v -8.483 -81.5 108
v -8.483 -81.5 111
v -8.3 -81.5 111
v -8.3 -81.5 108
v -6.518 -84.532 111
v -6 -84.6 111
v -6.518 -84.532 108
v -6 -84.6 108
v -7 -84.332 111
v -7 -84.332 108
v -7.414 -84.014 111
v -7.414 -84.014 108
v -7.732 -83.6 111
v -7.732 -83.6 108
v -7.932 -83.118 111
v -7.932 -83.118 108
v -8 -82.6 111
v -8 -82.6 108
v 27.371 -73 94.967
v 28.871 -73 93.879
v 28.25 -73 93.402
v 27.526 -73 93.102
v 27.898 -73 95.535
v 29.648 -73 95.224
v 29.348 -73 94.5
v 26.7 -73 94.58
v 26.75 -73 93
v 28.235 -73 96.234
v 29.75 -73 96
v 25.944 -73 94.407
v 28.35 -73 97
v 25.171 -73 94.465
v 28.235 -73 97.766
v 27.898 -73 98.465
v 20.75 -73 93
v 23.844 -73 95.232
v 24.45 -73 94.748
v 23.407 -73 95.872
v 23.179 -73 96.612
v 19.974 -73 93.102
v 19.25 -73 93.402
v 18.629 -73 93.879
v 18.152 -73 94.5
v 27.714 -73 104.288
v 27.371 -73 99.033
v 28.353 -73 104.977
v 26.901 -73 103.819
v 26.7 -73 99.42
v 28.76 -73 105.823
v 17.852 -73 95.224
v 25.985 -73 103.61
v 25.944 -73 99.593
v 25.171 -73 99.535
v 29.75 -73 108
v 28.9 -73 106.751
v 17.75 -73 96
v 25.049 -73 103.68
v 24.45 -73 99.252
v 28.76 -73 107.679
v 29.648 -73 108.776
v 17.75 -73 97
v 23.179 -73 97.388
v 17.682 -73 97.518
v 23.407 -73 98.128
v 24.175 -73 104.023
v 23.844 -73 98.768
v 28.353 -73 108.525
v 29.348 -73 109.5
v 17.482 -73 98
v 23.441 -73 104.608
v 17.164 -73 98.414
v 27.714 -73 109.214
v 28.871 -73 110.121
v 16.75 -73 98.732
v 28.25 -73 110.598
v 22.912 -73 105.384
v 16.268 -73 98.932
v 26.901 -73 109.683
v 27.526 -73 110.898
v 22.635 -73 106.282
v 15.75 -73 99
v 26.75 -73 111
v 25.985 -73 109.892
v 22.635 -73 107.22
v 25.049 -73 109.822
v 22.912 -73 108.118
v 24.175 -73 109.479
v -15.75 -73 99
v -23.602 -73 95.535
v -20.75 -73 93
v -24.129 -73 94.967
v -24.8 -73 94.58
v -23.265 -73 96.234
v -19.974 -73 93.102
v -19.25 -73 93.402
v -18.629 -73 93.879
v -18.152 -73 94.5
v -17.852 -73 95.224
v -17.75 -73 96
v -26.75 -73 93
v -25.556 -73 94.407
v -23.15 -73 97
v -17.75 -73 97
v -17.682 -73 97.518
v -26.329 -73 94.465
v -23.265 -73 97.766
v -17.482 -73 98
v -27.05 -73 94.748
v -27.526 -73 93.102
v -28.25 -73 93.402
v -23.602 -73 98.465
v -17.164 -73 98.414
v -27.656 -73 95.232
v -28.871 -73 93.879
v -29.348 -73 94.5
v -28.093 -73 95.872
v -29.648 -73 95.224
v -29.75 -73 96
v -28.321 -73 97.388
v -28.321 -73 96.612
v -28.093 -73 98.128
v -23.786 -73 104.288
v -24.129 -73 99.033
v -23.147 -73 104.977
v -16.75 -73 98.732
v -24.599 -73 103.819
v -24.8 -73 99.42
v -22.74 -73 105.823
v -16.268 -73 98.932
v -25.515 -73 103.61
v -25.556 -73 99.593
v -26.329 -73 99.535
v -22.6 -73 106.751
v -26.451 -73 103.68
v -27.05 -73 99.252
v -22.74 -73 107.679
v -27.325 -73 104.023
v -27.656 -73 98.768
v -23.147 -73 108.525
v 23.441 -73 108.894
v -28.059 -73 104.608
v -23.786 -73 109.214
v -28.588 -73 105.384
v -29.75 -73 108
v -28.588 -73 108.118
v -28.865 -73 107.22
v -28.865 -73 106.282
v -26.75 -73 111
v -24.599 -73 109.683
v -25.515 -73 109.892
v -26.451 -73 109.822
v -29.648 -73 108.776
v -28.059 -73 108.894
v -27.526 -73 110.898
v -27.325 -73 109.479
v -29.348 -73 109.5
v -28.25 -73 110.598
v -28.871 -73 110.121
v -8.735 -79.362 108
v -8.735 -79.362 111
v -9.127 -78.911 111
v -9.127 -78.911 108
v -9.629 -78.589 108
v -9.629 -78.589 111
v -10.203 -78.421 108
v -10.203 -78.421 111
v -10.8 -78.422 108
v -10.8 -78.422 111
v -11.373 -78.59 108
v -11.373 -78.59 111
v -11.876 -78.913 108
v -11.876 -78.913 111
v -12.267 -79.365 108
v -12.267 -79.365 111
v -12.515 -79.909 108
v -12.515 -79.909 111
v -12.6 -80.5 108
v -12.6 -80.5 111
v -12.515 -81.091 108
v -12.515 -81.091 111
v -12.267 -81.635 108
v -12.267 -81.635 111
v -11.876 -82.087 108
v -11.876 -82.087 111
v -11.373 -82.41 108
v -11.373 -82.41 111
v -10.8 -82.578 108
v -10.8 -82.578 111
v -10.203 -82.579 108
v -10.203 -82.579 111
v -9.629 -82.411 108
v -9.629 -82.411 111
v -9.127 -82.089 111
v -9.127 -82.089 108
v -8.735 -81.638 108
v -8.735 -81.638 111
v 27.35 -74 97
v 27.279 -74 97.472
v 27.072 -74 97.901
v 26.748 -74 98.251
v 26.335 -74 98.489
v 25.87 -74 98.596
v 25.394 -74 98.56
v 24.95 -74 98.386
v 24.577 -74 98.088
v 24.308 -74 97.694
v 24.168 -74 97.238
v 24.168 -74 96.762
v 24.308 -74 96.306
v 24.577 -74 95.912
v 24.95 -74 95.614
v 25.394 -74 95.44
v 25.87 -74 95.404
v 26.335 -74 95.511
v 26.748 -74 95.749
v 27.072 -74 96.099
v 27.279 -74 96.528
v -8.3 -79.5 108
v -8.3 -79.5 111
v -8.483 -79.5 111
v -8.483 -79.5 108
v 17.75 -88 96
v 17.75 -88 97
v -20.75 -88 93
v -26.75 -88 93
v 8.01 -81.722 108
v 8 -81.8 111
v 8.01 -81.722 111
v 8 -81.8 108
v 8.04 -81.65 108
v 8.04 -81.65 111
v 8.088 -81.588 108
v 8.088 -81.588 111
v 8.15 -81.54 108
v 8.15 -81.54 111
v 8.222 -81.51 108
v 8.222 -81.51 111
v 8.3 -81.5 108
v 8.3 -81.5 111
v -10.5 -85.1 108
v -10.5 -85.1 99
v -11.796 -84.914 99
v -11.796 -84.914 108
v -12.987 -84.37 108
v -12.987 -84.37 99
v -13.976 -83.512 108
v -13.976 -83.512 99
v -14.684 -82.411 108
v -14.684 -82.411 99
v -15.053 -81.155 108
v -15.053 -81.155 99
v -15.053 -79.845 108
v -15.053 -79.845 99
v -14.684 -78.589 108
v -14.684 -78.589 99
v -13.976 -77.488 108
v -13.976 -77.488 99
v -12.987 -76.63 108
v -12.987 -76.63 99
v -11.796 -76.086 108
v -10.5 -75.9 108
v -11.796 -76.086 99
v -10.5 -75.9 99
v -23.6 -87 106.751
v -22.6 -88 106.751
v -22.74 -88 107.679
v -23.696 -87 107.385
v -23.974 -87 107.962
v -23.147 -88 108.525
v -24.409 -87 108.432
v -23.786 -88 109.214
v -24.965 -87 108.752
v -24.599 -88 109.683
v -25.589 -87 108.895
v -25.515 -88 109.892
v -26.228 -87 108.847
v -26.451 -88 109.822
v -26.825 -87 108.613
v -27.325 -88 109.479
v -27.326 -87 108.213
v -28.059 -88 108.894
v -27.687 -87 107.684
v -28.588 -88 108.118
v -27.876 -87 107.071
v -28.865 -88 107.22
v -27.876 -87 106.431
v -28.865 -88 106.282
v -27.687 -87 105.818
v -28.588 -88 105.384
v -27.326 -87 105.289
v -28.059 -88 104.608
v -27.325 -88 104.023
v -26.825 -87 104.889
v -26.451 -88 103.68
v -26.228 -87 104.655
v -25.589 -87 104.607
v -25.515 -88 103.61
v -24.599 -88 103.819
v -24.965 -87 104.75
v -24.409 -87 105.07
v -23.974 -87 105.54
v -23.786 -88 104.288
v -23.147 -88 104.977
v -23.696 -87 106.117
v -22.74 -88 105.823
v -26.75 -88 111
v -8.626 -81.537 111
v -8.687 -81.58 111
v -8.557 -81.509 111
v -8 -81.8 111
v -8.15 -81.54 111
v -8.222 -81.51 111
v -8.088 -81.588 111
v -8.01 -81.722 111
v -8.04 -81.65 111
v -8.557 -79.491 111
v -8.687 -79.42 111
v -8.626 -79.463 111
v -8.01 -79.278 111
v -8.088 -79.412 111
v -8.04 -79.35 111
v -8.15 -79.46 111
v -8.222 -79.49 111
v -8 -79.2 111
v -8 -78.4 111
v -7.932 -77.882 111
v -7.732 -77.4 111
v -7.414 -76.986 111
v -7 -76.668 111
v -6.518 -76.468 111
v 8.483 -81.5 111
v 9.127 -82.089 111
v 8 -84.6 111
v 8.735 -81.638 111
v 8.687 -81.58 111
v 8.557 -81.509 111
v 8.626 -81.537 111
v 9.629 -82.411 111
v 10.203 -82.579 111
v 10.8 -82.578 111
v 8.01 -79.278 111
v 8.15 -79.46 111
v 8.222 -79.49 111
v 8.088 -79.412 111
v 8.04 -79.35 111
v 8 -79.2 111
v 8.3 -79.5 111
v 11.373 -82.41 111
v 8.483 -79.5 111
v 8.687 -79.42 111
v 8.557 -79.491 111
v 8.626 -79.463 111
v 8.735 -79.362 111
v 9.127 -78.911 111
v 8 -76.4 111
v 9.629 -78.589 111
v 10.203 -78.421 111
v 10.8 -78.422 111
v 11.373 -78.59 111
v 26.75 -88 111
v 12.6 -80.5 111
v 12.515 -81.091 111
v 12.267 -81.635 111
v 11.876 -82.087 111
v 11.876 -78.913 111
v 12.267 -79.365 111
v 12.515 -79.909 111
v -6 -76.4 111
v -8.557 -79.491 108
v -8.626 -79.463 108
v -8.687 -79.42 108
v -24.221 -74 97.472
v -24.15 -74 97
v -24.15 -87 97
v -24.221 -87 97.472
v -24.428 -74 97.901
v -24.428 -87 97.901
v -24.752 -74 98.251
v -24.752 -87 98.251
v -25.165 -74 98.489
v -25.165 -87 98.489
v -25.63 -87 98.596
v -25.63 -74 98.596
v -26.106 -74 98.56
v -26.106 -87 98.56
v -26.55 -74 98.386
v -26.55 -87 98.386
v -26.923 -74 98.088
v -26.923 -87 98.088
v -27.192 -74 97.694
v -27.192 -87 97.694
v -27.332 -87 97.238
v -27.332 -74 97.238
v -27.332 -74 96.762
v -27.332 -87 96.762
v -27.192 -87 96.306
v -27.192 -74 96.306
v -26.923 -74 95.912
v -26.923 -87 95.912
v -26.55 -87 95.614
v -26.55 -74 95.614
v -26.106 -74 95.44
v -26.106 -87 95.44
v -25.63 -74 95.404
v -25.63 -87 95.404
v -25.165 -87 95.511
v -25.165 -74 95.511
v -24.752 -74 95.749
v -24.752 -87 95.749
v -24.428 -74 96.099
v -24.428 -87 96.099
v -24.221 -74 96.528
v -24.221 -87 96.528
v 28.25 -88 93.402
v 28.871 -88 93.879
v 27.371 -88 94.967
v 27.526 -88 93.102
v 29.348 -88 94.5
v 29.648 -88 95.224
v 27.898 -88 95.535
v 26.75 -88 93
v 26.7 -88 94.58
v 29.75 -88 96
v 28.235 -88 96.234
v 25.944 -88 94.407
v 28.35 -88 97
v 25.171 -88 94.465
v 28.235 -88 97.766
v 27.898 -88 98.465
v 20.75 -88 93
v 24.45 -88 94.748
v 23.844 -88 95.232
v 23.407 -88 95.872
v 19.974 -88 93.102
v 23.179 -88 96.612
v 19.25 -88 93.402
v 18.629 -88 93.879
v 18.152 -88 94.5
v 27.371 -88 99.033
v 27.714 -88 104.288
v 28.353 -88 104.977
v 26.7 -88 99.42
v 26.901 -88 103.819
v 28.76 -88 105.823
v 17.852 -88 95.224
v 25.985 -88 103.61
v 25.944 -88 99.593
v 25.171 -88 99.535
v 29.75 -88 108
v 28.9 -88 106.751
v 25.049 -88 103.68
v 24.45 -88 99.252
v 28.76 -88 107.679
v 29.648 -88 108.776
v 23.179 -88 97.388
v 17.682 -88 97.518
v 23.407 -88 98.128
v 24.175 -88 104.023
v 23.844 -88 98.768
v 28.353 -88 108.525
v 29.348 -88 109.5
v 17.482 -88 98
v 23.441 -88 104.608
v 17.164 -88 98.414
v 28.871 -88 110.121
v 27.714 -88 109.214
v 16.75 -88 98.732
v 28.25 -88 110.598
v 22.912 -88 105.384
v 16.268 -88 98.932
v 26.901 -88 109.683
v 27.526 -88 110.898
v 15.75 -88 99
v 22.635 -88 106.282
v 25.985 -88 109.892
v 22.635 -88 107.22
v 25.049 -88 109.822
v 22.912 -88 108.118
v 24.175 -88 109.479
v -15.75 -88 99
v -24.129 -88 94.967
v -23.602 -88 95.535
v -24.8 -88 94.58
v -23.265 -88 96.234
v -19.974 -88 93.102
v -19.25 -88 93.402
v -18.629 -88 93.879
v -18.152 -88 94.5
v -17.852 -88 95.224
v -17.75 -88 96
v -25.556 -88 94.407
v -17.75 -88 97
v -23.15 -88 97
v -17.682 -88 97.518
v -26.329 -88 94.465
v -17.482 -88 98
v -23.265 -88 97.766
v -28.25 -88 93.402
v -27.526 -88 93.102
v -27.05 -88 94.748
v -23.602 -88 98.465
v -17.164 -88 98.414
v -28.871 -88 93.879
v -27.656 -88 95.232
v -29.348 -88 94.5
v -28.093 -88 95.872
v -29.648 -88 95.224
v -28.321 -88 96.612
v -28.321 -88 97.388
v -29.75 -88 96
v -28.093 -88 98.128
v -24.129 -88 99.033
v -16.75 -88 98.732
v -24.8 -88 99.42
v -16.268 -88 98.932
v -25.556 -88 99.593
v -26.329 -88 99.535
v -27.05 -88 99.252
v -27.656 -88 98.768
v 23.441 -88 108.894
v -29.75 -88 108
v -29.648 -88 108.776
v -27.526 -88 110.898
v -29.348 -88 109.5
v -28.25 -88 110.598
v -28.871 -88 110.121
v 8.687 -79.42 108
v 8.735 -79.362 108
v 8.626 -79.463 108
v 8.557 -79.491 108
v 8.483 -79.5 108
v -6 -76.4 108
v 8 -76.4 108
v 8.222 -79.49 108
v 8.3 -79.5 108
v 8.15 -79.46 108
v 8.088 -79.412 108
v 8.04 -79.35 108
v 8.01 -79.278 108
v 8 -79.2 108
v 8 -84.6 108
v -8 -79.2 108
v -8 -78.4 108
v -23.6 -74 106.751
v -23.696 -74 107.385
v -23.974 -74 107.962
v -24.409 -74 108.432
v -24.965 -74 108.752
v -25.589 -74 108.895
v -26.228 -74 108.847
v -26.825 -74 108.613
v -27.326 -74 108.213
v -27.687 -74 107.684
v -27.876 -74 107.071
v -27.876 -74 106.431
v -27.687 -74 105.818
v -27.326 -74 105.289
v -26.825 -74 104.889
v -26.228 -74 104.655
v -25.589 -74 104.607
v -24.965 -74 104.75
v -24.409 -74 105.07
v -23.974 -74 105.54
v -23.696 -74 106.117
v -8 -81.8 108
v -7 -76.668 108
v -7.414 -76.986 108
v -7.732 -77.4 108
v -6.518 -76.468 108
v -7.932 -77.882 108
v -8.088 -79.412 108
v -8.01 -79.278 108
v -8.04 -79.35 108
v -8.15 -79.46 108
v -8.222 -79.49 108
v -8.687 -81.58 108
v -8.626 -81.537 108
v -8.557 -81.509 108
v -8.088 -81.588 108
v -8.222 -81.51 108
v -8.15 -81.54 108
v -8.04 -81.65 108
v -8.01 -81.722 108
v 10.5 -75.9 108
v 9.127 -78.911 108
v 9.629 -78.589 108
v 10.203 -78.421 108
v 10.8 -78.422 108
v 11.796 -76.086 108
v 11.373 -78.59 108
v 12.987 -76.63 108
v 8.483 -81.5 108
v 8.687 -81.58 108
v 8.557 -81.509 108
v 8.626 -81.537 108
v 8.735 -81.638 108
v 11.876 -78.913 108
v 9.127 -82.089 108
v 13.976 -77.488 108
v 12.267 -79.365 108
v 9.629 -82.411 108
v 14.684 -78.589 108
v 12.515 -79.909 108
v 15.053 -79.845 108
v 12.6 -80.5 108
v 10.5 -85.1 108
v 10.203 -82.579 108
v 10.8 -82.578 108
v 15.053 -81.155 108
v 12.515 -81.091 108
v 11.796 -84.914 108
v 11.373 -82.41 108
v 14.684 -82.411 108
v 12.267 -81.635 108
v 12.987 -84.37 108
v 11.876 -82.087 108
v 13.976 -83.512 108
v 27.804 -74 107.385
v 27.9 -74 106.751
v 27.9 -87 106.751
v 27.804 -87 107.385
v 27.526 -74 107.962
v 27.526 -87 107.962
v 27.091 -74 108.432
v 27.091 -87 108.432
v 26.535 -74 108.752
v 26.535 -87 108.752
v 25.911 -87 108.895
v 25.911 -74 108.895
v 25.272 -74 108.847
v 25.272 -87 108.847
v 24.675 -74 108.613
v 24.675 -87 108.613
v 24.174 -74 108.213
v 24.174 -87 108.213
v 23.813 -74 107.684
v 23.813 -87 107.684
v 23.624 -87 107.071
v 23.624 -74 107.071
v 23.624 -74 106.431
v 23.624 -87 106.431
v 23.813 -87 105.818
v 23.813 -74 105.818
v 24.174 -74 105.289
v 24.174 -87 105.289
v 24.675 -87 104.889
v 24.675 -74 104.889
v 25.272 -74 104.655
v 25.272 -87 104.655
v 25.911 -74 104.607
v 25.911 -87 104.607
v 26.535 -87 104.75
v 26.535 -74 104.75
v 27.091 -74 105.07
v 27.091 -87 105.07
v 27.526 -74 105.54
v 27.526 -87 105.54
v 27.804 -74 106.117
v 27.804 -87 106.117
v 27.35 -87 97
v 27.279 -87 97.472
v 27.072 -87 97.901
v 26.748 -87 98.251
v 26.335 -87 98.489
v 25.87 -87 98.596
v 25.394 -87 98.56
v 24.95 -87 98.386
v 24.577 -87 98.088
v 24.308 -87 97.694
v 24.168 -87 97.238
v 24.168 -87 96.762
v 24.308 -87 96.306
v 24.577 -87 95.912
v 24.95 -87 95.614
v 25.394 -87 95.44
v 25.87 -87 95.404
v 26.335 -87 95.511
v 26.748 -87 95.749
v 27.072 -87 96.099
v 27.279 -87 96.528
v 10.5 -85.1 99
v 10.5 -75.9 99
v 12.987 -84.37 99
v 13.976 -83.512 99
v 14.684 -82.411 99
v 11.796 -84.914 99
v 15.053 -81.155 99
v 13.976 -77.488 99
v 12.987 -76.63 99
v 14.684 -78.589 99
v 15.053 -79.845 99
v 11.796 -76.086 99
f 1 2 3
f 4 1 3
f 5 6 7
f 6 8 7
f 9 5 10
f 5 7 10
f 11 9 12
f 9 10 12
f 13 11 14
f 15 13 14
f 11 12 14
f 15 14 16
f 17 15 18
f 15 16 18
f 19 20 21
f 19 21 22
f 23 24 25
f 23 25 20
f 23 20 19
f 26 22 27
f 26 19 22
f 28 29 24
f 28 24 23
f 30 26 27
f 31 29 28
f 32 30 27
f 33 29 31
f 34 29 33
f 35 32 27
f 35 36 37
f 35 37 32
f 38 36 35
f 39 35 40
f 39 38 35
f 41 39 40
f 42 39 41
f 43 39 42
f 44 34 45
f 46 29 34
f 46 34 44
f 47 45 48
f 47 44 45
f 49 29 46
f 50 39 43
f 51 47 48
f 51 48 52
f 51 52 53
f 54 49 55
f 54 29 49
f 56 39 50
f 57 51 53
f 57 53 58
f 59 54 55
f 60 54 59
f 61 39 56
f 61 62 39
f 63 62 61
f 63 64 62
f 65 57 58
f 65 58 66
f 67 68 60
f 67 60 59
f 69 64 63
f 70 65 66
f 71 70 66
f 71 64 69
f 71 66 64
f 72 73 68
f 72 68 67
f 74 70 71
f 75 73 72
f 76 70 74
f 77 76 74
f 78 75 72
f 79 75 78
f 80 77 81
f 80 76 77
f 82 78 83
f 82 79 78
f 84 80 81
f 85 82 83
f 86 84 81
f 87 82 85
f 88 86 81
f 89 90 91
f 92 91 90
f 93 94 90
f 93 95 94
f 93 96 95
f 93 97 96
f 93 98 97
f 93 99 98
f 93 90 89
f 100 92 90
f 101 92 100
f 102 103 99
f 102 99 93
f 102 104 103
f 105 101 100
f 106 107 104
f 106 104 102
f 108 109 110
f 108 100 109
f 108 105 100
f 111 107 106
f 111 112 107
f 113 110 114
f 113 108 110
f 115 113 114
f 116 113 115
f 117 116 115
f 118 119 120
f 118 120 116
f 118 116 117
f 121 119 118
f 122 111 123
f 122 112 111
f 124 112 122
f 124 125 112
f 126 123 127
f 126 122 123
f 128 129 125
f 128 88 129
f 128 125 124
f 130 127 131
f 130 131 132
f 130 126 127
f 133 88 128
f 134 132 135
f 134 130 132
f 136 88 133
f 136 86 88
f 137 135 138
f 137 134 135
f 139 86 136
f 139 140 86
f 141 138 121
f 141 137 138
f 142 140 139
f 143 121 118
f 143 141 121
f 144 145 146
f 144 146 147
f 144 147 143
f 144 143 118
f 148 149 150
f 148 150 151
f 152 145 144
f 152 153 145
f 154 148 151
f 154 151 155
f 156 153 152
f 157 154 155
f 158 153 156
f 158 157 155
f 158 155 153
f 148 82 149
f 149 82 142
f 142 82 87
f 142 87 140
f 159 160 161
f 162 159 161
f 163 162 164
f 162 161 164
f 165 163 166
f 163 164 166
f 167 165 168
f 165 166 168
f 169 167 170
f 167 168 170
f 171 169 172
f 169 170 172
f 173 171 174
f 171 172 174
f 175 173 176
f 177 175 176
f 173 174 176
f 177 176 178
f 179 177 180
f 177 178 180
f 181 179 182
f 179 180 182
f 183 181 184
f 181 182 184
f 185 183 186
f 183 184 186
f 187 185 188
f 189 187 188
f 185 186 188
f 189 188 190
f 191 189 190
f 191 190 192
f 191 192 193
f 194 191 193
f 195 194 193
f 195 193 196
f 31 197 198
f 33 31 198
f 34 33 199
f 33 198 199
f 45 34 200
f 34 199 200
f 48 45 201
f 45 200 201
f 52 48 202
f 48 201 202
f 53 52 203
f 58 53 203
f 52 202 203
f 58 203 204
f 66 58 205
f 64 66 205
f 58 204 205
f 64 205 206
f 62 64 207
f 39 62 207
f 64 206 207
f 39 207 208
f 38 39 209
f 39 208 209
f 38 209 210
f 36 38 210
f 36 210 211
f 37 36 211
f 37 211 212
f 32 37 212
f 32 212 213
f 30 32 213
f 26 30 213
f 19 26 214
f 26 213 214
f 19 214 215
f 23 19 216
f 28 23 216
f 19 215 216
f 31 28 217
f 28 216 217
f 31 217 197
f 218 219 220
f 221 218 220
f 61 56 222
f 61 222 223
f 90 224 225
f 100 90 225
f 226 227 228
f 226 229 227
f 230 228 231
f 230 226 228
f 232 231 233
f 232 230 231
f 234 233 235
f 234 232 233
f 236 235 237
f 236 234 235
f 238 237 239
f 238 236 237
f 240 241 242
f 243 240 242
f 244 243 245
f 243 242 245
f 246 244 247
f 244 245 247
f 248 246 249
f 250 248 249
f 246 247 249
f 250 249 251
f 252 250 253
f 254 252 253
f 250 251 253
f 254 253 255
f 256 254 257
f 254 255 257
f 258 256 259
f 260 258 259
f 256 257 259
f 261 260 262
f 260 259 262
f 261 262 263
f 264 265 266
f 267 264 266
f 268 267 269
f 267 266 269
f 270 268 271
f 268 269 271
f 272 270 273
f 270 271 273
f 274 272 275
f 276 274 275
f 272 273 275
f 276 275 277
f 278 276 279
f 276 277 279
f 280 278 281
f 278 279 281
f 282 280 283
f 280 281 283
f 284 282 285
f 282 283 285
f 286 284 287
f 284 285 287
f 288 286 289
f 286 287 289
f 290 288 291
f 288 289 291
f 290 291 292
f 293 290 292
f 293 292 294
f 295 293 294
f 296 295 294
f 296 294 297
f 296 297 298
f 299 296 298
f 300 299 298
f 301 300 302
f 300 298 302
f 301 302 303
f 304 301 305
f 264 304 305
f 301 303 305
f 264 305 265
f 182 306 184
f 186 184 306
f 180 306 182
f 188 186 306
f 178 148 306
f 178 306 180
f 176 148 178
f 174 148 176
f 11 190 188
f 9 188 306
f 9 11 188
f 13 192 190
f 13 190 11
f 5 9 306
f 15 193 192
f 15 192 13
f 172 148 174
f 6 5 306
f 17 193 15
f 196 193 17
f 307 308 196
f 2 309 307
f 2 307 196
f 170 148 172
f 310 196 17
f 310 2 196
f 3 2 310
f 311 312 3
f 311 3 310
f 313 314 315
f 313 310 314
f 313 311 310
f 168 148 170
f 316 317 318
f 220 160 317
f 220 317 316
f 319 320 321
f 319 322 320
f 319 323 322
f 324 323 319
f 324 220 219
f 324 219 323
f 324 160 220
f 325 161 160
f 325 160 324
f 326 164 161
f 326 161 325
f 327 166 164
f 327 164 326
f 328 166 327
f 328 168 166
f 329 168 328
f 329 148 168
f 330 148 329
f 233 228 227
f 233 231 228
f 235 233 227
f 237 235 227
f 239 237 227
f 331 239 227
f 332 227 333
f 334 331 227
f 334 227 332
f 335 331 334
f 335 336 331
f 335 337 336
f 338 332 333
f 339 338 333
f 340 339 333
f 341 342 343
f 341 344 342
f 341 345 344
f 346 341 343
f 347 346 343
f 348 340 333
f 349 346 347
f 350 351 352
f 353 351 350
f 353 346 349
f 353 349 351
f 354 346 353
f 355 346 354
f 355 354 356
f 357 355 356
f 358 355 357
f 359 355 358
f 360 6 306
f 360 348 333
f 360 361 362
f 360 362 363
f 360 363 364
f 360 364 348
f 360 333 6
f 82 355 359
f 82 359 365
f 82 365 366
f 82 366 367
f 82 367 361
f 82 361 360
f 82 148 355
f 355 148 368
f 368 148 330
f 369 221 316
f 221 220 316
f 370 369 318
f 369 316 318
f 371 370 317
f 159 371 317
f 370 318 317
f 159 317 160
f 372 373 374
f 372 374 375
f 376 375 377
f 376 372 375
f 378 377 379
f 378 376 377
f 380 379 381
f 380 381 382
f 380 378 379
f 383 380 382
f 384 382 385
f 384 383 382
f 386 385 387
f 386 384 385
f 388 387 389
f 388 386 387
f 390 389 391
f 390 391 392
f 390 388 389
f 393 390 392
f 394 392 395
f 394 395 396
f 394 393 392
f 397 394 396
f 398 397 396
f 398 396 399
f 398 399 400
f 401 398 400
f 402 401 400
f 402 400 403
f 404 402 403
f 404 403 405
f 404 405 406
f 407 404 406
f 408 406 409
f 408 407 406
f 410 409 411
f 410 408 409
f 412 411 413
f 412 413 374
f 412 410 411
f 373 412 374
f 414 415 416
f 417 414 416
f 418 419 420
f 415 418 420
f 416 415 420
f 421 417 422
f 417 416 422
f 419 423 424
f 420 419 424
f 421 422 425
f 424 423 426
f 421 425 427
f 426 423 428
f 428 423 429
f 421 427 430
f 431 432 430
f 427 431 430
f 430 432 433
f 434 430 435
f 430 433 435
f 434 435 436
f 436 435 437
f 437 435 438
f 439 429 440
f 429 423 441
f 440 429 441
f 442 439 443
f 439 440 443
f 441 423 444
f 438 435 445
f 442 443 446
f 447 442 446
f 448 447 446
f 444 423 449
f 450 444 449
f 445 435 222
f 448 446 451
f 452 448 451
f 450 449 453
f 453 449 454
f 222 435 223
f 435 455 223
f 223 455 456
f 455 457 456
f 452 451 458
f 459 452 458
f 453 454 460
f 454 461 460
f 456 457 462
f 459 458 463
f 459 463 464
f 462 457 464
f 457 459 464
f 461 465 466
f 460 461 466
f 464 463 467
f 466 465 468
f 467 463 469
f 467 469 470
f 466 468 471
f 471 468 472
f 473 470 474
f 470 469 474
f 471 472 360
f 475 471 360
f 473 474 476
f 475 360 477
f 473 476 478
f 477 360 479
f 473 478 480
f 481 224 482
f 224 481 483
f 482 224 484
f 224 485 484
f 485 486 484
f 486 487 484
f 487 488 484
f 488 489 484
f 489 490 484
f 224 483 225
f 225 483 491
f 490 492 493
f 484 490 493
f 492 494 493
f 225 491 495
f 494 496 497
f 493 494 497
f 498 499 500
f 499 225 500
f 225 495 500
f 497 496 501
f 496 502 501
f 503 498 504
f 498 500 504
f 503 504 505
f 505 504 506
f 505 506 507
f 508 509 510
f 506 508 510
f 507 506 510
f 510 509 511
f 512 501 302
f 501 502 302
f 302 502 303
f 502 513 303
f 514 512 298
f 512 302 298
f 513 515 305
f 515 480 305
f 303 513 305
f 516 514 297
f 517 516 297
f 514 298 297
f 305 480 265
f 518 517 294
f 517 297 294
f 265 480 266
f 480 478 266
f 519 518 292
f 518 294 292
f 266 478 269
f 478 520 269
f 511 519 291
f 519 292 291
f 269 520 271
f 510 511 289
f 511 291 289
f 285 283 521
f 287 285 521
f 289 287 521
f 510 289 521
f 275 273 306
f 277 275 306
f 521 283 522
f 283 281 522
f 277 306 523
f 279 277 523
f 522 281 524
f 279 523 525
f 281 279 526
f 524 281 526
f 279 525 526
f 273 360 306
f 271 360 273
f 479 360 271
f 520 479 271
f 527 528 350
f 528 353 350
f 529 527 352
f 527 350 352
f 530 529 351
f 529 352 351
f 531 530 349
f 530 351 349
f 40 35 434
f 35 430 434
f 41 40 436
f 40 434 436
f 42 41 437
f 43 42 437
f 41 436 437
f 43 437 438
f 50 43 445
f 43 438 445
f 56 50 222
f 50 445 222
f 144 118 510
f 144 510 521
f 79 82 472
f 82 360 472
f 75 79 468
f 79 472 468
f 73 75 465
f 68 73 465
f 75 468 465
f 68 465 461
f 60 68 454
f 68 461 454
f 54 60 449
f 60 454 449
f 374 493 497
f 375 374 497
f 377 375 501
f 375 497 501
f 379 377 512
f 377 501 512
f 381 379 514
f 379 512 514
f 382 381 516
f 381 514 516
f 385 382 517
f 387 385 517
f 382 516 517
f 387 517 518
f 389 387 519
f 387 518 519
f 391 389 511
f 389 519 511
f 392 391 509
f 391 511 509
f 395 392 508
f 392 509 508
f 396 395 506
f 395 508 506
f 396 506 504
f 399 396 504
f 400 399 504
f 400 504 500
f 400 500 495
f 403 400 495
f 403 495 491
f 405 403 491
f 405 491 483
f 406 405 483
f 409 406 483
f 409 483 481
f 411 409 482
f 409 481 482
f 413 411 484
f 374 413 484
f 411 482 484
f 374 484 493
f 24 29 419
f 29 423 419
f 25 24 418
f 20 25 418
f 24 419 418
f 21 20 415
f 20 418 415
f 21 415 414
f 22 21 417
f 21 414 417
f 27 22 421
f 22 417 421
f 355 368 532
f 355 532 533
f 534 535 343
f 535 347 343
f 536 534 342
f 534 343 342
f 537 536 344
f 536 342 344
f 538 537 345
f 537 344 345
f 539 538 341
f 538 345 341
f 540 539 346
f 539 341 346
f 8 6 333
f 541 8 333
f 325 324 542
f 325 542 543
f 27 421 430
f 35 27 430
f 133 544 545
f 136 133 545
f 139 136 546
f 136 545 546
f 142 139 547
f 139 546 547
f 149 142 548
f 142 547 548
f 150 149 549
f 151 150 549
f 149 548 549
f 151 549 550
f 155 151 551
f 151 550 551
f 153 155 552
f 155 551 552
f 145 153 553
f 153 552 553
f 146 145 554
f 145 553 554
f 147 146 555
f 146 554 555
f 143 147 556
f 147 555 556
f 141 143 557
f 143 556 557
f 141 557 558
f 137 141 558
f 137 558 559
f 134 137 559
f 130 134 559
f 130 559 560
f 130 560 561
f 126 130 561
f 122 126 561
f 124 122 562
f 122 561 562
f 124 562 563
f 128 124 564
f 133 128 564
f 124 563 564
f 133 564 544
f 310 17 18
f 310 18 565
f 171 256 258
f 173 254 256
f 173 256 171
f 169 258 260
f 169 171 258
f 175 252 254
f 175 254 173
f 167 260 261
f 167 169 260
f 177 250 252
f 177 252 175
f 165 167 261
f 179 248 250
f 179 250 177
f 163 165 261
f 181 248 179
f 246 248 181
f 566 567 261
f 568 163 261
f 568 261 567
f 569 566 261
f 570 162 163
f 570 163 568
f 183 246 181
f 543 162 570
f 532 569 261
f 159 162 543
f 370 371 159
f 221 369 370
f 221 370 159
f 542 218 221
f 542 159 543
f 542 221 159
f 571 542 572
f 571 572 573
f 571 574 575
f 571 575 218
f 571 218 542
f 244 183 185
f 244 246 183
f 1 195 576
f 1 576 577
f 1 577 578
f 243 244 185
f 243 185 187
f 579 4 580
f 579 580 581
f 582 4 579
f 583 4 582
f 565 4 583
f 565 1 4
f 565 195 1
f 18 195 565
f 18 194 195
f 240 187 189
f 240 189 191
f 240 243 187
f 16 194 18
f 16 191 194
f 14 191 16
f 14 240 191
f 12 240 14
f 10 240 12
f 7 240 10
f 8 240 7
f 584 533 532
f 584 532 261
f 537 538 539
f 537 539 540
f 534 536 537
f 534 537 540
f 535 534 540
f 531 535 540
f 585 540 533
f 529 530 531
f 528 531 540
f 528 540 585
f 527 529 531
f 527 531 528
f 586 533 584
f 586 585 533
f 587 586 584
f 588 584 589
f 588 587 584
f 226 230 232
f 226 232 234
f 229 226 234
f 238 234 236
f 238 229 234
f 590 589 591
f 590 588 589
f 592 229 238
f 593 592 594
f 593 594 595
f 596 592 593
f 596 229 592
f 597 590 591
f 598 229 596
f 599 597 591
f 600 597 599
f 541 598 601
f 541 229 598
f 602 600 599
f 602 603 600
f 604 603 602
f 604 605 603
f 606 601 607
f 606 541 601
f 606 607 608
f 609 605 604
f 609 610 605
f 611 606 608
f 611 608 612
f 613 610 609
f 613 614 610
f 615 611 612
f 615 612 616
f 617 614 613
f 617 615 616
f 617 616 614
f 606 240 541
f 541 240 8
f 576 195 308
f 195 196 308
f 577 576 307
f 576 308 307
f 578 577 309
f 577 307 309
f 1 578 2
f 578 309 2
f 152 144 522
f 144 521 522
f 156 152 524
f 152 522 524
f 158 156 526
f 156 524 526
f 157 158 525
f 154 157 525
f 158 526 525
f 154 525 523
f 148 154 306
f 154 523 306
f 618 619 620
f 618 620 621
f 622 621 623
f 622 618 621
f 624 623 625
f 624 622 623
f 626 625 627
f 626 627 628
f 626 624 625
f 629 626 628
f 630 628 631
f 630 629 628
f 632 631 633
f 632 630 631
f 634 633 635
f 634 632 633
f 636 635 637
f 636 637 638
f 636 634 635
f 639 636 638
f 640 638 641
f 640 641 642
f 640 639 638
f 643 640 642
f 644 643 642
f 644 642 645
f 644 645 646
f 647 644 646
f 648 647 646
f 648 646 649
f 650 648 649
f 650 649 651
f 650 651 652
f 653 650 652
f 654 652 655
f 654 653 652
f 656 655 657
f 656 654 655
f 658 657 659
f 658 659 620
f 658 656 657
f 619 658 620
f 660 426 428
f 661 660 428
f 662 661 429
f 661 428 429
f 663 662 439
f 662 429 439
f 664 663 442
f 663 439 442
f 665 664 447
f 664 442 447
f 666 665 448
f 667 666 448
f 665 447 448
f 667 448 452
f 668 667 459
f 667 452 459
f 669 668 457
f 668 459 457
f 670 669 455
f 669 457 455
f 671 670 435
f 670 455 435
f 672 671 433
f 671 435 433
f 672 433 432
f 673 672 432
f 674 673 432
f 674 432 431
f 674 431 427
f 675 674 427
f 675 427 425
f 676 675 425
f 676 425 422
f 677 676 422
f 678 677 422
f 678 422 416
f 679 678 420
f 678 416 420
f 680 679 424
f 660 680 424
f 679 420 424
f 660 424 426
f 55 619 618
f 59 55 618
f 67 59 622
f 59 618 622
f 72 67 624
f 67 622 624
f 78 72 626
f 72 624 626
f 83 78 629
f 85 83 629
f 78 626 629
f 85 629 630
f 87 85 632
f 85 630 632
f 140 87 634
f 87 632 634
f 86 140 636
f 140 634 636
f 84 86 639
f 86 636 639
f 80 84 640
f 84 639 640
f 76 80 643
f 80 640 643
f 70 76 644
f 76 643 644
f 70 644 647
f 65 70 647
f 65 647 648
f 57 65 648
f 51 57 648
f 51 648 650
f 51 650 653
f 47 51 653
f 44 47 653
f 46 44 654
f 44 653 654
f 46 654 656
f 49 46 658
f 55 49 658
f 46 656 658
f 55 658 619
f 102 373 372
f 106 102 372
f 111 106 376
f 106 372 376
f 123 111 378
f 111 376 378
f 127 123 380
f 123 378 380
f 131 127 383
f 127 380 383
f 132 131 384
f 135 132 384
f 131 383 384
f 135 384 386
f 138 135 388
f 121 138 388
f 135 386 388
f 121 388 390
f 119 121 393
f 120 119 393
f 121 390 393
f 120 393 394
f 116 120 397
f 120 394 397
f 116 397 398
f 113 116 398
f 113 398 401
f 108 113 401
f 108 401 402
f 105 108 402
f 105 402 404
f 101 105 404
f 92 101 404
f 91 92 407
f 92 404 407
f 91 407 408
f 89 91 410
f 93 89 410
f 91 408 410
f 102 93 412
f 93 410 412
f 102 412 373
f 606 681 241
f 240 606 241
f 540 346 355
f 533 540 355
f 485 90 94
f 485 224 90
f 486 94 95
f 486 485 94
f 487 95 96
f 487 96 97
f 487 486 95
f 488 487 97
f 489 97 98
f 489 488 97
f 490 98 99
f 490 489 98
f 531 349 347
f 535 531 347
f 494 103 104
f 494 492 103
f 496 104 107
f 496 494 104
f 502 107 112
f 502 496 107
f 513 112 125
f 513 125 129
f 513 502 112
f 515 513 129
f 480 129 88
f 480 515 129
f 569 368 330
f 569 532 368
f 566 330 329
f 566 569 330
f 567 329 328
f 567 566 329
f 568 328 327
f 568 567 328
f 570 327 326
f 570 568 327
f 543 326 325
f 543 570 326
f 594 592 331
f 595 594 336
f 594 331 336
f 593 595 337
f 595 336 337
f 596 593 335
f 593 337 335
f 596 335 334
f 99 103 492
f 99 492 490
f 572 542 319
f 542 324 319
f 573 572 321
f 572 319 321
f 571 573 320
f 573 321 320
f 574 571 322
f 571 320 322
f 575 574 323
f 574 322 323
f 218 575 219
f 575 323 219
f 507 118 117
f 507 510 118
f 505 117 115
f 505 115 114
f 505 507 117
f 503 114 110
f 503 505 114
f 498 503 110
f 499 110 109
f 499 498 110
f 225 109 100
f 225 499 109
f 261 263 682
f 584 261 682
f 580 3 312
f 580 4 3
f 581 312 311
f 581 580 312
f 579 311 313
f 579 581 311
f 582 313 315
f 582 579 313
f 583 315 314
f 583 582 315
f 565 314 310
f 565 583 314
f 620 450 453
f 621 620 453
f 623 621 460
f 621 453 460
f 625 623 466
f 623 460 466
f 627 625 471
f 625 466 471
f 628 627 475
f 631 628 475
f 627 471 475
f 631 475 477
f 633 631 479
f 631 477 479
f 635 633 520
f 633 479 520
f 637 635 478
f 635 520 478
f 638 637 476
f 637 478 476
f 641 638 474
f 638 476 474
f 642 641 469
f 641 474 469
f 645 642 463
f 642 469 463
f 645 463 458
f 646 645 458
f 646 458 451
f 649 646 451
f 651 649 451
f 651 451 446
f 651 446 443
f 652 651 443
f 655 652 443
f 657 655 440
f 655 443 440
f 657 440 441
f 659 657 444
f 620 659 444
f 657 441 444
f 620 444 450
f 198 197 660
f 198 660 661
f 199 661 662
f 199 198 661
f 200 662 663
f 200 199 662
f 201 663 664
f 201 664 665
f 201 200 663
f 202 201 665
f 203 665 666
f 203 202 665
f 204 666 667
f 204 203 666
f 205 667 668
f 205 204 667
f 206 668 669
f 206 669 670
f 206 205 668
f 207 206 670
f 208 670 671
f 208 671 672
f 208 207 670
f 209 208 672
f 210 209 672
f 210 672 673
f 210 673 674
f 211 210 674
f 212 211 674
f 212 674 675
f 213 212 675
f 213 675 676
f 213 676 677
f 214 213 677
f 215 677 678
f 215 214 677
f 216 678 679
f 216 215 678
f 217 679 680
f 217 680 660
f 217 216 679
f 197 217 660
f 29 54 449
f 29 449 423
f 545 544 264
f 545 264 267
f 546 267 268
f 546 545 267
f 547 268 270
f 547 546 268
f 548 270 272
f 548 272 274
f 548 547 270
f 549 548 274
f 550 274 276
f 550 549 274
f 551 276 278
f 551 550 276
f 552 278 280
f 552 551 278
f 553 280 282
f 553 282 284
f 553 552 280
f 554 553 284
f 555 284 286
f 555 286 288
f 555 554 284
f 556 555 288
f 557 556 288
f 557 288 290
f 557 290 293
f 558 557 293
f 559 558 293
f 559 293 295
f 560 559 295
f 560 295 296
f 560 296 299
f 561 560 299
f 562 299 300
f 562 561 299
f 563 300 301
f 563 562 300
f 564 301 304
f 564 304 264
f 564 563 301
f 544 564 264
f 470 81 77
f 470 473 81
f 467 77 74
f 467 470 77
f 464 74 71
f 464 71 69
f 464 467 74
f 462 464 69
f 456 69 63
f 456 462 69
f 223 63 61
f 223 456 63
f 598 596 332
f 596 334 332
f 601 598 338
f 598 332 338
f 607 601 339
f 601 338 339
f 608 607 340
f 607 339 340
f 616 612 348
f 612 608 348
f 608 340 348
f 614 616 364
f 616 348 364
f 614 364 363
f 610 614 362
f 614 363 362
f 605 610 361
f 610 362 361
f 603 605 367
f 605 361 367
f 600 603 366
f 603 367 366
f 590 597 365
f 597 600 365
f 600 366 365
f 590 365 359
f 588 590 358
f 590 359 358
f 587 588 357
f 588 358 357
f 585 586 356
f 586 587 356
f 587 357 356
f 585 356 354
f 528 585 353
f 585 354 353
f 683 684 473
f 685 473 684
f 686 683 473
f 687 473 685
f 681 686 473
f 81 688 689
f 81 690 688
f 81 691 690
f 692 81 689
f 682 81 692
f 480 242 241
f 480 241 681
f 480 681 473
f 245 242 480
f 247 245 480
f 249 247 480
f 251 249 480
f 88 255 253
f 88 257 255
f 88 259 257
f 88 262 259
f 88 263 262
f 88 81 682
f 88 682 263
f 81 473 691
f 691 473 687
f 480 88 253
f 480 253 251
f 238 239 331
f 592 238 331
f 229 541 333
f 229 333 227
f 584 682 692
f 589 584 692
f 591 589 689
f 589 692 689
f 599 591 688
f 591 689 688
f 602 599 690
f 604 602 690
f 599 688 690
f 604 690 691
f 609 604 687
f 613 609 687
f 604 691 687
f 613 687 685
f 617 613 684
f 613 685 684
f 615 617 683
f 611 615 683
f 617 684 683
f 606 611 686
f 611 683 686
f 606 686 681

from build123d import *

# Parameters (mm, degrees)
SKETCH015_R     = 2.15
SKETCH015_R_2   = 1.6
PAD005_DEPTH    = 15
FILLET003_R     = 3
FILLET004_R     = 2
CHAMFER007_SIZE = 1
SKETCH016_R     = 2.1
SKETCH016_W     = 16
SKETCH016_H     = 8.2
POCKET008_DEPTH = 18.001
POCKET009_DEPTH = 9
FILLET005_R     = 2
POCKET010_DEPTH = 18.001
FILLET006_R     = 0.3


with BuildPart() as part:
    # Sketch015 (on Face1 of Binder001) → Pad005 (new body)
    with BuildSketch(Plane(origin=(1.2e-05, -73, 0), x_dir=(1, 0, 0), z_dir=(0, -1, 0))):
        Polygon((-29.75, 93), (-29.75, 111), (29.75, 111), (29.75, 93), (17.75, 93), (17.75, 99), (-17.75, 99), (-17.75, 93), align=None)
        with Locations((-25.75, 106.751)):
            Circle(SKETCH015_R, mode=Mode.SUBTRACT)
        with Locations((-25.75, 97)):
            Circle(SKETCH015_R_2, mode=Mode.SUBTRACT)
        with Locations((25.75, 97)):
            Circle(SKETCH015_R_2, mode=Mode.SUBTRACT)
        with Locations((25.75, 106.751)):
            Circle(SKETCH015_R, mode=Mode.SUBTRACT)
    extrude(amount=PAD005_DEPTH)

    # Fillet003
    fillet003_edges = [part.edges().sort_by_distance(p)[0] for p in [
        (-29.749986, -80.500005, 111),
        (29.750014, -80.499995, 111),
        (-29.749986, -80.500005, 93),
        (-17.749986, -80.500003, 93),
        (17.750014, -80.499997, 93),
        (29.750014, -80.499995, 93),
    ]]
    fillet(fillet003_edges, radius=FILLET003_R)

    # Fillet004
    fillet004_edges = [part.edges().sort_by_distance(p)[0] for p in [
        (-17.749986, -80.500003, 99),
        (17.750014, -80.499997, 99),
    ]]
    fillet(fillet004_edges, radius=FILLET004_R)

    # Chamfer007
    chamfer007_edges = [part.edges().sort_by_distance(p)[0] for p in [
        (23.600012, -72.999996, 106.751),
        (24.150012, -72.999996, 97),
        (-27.349988, -73.000005, 97),
        (-27.899988, -73.000005, 106.751),
        (24.150015, -87.999996, 97),
        (23.600015, -87.999996, 106.751),
        (-27.899985, -88.000005, 106.751),
        (-27.349985, -88.000005, 97),
    ]]
    chamfer(chamfer007_edges, length=CHAMFER007_SIZE)

    # Sketch016 (on Face15 of Chamfer007) → Pocket008 (cut, through all)
    with BuildSketch(Plane.XY.offset(111)):
        with Locations((-10.5, -80.5)):
            Circle(SKETCH016_R)
        with Locations((10.5, -80.5)):
            Circle(SKETCH016_R)
        with Locations((0, -80.5)):
            Rectangle(SKETCH016_W, SKETCH016_H)
    extrude(amount=-POCKET008_DEPTH, mode=Mode.SUBTRACT)

    # Sketch017 (on Face6 of Pocket008) → Pocket009 (cut)
    with BuildSketch(Plane(origin=(0, 0, 99), x_dir=(1, 0, 0), z_dir=(0, 0, -1))):
        with BuildLine():
            ThreePointArc((-10.5, 85.1), (-15.1, 80.5), (-10.5, 75.9))
            Line((-10.5, 75.9), (10.5, 75.9))
            ThreePointArc((10.5, 75.9), (15.1, 80.5), (10.5, 85.1))
            Line((10.5, 85.1), (-10.5, 85.1))
        make_face()
    extrude(amount=-POCKET009_DEPTH, mode=Mode.SUBTRACT)

    # Fillet005
    fillet005_edges = [part.edges().sort_by_distance(p)[0] for p in [
        (-8, -76.4, 109.5),
        (-8, -84.6, 109.5),
    ]]
    fillet(fillet005_edges, radius=FILLET005_R)

    # Sketch018 (on Face1 of Fillet005) → Pocket010 (cut, through all)
    with BuildSketch(Plane.XY.offset(111)):
        with BuildLine():
            ThreePointArc((-10.5, -79.5), (-11.5, -80.5), (-10.5, -81.5))
            Line((-10.5, -81.5), (10.5, -81.5))
            ThreePointArc((10.5, -81.5), (11.5, -80.5), (10.5, -79.5))
            Line((10.5, -79.5), (-10.5, -79.5))
        make_face()
    extrude(amount=-POCKET010_DEPTH, mode=Mode.SUBTRACT)

    # Fillet006
    fillet006_edges = [part.edges().sort_by_distance(p)[0] for p in [
        (-8, -79.5, 109.5),
        (-8.653381, -79.5, 109.5),
        (-8, -81.5, 109.5),
        (-8.653381, -81.5, 109.5),
        (8.653381, -79.5, 109.5),
        (8, -79.5, 109.5),
        (8.653381, -81.5, 109.5),
        (8, -81.5, 109.5),
    ]]
    fillet(fillet006_edges, radius=FILLET006_R)


solid = part.part
